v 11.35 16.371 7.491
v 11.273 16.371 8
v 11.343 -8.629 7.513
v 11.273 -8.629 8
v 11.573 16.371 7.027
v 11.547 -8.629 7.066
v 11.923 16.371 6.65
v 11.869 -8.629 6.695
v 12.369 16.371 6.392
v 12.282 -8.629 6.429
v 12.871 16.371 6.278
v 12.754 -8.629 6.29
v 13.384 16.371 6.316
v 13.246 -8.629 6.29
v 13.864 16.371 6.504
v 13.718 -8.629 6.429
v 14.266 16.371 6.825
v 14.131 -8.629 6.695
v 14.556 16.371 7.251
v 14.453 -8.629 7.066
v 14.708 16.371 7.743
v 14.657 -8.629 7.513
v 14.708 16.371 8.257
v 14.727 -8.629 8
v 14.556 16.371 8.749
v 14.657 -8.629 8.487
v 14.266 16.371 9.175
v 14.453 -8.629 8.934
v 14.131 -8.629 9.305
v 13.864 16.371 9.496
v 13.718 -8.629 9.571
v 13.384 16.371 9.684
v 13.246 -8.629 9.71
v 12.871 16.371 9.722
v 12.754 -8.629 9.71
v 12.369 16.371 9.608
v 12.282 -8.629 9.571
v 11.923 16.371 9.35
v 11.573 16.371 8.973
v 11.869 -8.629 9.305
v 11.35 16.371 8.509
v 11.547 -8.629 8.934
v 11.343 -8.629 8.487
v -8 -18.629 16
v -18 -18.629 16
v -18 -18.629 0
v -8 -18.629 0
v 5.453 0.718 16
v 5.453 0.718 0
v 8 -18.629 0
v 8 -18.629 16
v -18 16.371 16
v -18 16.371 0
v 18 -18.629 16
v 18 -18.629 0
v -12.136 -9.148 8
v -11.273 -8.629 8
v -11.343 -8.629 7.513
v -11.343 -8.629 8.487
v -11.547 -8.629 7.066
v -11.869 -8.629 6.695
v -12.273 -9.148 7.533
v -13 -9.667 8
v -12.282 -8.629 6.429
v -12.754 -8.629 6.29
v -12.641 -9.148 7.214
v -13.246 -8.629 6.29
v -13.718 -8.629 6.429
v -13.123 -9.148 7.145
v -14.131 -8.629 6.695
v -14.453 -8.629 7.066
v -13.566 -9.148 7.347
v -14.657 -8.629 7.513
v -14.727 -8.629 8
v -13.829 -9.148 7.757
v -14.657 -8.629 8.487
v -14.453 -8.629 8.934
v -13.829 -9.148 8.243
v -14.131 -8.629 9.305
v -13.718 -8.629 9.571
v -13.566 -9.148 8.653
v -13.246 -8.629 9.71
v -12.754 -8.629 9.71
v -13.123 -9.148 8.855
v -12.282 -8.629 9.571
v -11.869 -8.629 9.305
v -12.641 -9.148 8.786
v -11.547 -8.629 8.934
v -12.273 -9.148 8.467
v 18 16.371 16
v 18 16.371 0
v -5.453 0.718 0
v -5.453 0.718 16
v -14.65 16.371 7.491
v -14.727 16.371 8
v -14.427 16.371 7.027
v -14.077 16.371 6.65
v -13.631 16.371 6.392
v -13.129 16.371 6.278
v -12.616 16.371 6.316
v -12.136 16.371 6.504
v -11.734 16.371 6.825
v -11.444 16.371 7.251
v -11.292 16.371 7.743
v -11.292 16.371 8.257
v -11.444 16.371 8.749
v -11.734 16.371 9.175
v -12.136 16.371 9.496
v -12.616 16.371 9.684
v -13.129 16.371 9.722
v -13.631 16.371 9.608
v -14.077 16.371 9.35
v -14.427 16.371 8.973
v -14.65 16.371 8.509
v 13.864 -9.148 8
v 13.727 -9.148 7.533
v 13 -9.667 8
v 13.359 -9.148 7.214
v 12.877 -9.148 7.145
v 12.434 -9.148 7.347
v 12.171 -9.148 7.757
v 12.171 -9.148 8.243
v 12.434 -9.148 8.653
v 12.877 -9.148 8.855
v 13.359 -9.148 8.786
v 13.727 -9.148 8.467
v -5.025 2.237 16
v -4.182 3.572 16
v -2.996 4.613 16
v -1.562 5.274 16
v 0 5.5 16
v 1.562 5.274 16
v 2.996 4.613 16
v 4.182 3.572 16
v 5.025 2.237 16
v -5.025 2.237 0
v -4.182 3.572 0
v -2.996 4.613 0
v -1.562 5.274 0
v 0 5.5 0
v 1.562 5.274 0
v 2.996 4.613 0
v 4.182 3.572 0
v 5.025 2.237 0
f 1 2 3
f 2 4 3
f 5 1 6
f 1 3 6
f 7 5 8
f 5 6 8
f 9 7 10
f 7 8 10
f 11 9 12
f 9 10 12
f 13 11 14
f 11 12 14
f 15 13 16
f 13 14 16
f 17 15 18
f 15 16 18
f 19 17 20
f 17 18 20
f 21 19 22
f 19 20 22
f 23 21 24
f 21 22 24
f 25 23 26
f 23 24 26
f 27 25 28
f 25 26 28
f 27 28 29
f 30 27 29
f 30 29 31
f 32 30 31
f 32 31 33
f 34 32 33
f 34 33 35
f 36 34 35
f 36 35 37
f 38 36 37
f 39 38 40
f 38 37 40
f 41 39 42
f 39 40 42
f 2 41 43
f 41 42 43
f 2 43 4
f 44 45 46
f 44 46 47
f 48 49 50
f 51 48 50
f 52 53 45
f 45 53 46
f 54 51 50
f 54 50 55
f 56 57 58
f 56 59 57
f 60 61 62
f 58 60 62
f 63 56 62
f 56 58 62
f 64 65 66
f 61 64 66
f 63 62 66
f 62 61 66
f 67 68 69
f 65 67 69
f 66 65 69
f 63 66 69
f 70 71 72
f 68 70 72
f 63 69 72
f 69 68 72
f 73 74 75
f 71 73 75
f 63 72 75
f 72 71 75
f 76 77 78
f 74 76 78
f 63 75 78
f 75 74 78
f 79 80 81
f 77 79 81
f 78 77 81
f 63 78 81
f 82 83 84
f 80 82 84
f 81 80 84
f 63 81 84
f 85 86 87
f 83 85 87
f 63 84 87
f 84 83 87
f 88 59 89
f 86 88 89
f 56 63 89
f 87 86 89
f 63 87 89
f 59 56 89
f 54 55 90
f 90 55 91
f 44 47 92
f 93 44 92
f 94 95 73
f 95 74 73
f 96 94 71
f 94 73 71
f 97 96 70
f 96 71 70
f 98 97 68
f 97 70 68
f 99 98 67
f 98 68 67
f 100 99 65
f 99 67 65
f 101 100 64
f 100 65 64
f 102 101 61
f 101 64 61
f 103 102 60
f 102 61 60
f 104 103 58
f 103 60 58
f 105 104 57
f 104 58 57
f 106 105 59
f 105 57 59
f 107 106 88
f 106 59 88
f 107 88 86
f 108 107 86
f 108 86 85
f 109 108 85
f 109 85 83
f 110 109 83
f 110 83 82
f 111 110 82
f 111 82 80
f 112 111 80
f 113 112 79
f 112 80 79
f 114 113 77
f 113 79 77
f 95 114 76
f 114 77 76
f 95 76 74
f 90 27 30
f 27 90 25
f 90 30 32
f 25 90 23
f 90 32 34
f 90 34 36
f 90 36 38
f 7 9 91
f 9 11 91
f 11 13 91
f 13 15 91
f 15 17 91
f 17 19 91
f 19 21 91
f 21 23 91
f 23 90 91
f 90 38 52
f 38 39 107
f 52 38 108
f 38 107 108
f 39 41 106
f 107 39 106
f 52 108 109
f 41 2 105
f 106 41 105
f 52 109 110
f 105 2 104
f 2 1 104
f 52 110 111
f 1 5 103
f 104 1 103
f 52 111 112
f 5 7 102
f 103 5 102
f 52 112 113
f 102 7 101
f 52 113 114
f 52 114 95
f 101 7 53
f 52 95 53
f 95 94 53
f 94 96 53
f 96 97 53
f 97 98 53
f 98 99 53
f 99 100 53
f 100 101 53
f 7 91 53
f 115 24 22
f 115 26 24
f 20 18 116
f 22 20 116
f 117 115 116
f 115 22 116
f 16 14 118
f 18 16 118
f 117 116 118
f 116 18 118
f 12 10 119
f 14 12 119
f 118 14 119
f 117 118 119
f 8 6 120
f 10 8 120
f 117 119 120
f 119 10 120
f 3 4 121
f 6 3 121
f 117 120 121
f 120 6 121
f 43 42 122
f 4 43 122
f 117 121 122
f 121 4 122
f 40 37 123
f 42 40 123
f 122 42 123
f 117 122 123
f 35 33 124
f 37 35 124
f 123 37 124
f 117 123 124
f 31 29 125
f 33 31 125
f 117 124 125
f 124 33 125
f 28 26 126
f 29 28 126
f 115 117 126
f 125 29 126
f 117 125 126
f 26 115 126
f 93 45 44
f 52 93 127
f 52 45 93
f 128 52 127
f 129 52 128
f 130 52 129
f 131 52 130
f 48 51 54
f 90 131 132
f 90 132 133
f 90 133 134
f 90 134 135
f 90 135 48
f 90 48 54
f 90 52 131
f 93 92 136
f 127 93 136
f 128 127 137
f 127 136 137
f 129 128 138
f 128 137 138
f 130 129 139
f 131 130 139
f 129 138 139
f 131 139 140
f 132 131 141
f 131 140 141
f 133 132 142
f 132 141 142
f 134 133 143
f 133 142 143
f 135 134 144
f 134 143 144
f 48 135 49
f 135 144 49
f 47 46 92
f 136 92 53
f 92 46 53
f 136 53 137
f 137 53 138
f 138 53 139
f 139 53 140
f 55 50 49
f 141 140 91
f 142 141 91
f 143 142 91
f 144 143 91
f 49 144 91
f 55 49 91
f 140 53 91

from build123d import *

# Parameters (mm, degrees)
BOSS_EXTRUDE1_DEPTH       = 16
F_8_36_TAPPED_HOLE1_D     = 3.4544
F_8_36_TAPPED_HOLE1_DEPTH = 25
F_8_36_TAPPED_HOLE1_TIP   = 1.037806461


with BuildPart() as part:
    # Sketch1 → Boss-Extrude1 (new body)
    with BuildSketch(Plane.XY):
        with BuildLine():
            Line((5.452946738, 0.717894057), (8, -18.628896236))
            Line((8, -18.628896236), (18, -18.628896236))
            Line((18, -18.628896236), (18, 16.371103764))
            Line((18, 16.371103764), (-18, 16.371103764))
            Line((-18, 16.371103764), (-18, -18.628896236))
            Line((-18, -18.628896236), (-8, -18.628896236))
            Line((-8, -18.628896236), (-5.452946738, 0.717894057))
            ThreePointArc((-5.452946738, 0.717894057), (0, 5.5), (5.452946738, 0.717894057))
        make_face()
    extrude(amount=BOSS_EXTRUDE1_DEPTH)

    # #8-36 Tapped Hole1
    with Locations(Plane(origin=(0, 16.371103764, 0), x_dir=(1, 0, 0), z_dir=(0, 1, 0))):
        with Locations((-13, -8), (13, -8)):
            Hole(F_8_36_TAPPED_HOLE1_D / 2, depth=F_8_36_TAPPED_HOLE1_DEPTH)
            with Locations((0, 0, -(F_8_36_TAPPED_HOLE1_DEPTH + F_8_36_TAPPED_HOLE1_TIP / 2))):  # 118° drill point
                Cone(0, F_8_36_TAPPED_HOLE1_D / 2, F_8_36_TAPPED_HOLE1_TIP, mode=Mode.SUBTRACT)


solid = part.part
